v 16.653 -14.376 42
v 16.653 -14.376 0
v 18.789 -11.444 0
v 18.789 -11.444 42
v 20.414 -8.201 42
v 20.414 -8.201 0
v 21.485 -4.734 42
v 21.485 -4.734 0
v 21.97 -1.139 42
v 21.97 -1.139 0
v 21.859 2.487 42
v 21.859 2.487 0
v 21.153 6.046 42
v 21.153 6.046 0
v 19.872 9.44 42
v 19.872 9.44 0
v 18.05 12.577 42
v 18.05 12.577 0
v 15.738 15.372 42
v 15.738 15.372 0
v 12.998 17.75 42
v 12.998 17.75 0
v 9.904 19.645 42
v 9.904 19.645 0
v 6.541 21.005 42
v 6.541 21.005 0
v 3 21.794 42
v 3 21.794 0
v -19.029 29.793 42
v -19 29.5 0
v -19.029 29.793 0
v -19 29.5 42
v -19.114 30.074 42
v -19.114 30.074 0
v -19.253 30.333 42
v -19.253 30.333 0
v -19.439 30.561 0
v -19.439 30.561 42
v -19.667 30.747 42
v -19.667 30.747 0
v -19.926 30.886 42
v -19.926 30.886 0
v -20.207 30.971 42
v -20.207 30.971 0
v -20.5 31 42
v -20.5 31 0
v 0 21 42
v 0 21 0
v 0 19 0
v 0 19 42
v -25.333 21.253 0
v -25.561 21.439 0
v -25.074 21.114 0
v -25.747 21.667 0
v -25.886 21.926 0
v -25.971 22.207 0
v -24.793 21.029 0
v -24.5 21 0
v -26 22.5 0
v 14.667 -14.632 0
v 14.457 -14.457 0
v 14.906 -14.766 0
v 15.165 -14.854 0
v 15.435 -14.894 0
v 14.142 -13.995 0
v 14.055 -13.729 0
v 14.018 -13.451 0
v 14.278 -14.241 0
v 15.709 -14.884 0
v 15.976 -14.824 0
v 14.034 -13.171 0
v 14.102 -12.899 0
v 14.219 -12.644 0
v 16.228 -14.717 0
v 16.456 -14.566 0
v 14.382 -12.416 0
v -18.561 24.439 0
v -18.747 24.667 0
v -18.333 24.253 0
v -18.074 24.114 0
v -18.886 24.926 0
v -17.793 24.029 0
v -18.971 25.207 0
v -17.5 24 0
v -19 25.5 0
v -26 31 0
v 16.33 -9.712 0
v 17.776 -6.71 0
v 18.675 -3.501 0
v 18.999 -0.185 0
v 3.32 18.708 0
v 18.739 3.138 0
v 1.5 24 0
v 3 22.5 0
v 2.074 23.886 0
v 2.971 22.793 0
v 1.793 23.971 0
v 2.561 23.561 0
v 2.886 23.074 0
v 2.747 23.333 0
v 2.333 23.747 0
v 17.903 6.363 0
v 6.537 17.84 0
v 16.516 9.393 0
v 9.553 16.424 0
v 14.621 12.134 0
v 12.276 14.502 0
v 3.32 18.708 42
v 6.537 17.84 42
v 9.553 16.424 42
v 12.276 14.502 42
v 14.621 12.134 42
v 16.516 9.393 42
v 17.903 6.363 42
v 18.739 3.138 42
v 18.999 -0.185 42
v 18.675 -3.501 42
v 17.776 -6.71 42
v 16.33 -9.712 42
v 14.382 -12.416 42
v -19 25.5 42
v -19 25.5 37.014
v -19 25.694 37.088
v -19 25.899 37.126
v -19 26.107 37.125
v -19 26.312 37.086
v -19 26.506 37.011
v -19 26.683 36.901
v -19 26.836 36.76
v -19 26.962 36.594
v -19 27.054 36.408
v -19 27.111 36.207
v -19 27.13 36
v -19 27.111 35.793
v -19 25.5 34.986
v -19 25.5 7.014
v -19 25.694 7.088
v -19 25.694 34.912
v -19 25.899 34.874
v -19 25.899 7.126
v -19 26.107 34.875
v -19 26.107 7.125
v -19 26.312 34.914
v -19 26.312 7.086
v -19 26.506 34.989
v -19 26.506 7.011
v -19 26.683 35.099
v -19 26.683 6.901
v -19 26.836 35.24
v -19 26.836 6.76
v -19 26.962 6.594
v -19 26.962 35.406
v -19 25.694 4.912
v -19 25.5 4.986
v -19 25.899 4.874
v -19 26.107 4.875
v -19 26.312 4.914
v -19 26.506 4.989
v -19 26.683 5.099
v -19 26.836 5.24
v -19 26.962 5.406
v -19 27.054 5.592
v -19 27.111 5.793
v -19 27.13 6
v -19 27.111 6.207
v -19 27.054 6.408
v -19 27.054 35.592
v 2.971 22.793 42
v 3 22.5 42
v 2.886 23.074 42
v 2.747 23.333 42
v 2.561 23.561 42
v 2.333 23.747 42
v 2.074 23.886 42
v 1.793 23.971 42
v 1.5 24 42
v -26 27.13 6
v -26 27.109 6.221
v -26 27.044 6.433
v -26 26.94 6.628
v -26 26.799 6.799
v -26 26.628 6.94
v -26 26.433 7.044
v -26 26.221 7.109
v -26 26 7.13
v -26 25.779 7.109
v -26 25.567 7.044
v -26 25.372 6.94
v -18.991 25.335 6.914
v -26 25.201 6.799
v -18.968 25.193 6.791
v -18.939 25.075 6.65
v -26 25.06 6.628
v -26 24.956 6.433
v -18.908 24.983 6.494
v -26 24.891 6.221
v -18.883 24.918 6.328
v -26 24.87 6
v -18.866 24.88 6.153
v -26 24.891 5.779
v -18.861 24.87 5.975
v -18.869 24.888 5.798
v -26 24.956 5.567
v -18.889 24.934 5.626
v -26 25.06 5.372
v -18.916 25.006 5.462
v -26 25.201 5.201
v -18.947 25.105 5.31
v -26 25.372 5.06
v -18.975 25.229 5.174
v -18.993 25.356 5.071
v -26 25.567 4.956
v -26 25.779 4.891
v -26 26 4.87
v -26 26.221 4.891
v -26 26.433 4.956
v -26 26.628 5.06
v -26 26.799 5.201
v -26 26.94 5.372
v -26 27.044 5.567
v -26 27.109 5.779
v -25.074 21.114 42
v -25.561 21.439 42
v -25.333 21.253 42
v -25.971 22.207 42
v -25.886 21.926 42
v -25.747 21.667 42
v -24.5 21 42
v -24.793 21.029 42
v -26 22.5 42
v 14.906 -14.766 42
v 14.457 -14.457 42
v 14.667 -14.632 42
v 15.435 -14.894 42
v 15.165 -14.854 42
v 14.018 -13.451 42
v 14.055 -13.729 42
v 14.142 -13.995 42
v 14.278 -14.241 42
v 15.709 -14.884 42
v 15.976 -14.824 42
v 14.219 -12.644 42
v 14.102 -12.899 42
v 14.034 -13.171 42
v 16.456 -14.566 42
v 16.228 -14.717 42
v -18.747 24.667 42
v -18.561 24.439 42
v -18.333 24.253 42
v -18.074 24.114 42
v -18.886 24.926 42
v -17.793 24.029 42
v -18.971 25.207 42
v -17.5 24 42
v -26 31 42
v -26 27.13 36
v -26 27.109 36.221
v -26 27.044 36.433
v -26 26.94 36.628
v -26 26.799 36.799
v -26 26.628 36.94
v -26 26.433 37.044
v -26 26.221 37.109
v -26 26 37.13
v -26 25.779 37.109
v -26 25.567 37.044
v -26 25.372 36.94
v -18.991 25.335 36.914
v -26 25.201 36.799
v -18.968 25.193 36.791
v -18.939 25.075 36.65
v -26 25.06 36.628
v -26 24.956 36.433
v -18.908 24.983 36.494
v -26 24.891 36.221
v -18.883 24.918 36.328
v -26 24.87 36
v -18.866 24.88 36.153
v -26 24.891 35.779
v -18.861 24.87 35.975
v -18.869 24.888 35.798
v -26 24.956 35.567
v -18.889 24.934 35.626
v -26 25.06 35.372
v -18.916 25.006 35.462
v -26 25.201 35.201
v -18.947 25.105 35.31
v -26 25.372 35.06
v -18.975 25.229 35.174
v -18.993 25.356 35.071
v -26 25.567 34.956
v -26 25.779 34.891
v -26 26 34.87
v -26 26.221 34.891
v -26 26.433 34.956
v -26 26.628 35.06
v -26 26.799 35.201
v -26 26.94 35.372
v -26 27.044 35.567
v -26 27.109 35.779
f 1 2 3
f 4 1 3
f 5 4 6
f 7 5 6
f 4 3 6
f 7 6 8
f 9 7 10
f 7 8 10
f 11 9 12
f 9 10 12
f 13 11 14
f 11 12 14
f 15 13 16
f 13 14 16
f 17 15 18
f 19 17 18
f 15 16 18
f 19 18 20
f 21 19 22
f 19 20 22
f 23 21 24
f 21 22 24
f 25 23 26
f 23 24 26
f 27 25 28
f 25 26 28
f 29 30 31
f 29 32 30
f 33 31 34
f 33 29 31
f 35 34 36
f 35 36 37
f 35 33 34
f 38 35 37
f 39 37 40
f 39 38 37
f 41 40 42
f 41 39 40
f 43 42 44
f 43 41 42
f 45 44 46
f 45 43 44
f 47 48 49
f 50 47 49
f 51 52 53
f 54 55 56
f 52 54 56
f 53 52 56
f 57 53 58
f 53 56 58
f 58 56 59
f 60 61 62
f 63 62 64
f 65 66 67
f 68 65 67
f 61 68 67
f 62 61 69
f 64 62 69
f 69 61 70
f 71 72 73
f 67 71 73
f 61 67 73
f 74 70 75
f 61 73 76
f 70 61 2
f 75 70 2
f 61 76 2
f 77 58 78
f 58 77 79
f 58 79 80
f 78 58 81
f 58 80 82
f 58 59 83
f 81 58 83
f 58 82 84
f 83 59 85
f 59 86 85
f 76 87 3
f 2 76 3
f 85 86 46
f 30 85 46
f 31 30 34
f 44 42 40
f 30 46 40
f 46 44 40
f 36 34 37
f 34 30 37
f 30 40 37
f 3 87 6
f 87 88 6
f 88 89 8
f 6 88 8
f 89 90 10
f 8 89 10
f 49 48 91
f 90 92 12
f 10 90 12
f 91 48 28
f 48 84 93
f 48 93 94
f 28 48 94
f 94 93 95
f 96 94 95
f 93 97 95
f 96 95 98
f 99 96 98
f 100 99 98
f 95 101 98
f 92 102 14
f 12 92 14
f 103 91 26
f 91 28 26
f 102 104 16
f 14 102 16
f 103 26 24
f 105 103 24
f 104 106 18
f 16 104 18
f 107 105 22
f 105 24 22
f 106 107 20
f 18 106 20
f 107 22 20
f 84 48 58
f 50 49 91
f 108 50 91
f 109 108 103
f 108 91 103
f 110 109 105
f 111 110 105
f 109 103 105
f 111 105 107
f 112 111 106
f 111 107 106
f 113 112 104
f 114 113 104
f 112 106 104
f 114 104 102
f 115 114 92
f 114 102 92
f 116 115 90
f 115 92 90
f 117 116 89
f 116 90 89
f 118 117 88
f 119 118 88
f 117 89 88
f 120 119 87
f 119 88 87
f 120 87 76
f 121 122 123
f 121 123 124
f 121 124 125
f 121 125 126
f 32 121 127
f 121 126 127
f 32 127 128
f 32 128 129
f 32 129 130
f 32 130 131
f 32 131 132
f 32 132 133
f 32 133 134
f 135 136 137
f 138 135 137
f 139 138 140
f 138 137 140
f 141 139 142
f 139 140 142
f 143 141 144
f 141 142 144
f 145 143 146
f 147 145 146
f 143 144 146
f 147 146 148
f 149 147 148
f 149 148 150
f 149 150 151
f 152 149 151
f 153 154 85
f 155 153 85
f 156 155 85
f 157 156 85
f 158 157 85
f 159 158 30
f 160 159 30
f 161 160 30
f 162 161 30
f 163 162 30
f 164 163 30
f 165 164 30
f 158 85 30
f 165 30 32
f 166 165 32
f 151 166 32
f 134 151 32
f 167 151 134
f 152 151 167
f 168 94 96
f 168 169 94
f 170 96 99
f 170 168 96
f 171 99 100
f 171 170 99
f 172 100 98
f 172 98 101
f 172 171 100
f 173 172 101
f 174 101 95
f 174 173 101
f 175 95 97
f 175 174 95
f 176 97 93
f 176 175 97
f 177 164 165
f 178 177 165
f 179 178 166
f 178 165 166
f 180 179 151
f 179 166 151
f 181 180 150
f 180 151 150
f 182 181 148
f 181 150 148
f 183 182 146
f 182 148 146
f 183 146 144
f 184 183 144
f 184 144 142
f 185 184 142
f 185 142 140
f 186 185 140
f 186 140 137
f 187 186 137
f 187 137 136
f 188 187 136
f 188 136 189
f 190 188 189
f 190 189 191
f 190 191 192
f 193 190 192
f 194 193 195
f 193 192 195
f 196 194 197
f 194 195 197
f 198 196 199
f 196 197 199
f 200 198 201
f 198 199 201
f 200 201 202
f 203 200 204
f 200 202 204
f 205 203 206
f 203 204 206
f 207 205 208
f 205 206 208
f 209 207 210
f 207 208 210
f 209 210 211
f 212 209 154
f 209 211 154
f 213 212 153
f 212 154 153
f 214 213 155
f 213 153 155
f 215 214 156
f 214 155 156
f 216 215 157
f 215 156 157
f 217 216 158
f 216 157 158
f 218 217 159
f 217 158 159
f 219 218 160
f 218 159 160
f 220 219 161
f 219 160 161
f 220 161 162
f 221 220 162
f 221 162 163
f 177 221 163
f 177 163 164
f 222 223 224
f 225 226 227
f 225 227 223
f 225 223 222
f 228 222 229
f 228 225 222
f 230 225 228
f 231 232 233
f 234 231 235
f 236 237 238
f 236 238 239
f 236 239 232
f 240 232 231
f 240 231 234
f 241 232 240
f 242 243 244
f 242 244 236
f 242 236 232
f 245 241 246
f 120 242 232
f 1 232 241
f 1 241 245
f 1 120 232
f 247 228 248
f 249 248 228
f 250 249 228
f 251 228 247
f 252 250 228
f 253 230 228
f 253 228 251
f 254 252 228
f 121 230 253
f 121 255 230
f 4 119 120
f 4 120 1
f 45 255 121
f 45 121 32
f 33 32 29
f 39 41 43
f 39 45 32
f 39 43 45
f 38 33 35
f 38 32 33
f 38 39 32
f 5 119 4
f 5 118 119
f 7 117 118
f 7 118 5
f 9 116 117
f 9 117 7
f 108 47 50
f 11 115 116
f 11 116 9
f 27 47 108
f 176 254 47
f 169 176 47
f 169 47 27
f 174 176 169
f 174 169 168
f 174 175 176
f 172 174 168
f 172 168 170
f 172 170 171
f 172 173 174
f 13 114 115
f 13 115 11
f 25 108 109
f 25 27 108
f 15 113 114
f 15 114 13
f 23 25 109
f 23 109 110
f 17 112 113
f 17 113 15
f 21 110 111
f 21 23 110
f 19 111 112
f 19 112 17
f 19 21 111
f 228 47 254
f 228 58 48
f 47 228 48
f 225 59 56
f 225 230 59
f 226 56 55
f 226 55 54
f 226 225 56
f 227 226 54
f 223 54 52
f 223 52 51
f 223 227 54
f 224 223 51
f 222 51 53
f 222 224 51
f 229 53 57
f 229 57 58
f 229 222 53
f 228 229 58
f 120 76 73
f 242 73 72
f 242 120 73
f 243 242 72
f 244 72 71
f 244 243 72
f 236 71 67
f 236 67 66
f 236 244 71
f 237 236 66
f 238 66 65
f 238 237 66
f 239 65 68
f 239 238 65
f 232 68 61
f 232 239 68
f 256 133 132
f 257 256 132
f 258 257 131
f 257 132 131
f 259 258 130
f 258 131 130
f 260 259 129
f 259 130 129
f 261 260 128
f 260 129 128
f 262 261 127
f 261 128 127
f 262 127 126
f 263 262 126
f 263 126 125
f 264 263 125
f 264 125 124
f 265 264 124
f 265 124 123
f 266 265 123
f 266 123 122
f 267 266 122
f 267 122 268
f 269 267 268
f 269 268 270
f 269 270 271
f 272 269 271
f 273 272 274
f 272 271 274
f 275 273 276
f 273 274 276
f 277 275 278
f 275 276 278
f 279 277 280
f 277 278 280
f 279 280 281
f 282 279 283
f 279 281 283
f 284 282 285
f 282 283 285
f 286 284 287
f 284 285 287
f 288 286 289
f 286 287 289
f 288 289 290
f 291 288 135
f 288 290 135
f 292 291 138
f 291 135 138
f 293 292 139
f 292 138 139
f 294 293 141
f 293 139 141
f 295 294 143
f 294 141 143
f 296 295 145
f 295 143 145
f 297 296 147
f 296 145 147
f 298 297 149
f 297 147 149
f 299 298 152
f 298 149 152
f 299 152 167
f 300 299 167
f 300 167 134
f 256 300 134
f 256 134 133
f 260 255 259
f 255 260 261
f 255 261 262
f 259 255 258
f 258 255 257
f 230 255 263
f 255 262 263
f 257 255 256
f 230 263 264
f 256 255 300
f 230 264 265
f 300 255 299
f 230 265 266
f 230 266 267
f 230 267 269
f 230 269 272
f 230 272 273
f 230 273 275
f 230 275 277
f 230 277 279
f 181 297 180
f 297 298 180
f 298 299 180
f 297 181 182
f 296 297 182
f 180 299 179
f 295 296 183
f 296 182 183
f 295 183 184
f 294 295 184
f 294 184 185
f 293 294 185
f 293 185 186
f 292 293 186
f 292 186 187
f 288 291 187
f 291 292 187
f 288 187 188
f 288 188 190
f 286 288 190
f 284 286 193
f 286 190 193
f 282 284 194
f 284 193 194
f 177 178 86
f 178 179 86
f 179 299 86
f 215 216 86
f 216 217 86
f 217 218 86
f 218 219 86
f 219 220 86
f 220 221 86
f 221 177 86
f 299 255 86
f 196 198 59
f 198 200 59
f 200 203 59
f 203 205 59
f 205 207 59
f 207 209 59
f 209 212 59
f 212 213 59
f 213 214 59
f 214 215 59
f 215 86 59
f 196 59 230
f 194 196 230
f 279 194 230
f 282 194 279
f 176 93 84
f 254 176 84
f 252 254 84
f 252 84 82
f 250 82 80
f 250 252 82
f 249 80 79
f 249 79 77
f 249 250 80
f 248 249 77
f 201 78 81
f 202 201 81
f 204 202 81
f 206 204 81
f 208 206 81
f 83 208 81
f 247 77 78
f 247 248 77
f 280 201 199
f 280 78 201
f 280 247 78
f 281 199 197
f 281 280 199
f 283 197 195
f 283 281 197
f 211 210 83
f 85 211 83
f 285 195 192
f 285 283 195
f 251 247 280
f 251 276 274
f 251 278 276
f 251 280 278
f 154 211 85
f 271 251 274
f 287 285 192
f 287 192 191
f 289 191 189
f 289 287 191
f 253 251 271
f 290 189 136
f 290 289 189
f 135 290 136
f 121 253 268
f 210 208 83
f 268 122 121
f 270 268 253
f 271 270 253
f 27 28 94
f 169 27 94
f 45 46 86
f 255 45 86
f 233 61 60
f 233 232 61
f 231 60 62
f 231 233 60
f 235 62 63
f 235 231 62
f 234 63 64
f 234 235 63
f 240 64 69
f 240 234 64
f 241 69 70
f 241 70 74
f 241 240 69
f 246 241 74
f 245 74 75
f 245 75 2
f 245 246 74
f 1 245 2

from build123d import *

# Parameters (mm, degrees)
F1_DEPTH = 42
F2_R     = 1.49999
F4_D     = 2.2606
F4_DEPTH = 18.57375
F4_TIP   = 0.6791527577


# Not quite as in the source:
# - a fillet or chamfer is up to 0.001 mm smaller than in the source, because OpenCascade refuses the exact size


with BuildPart() as f1:
    # F0 (on Top) → F1 (new body)
    with BuildSketch(Plane.XY):
        with BuildLine():
            ThreePointArc((0, 19), (17.5537111177, 7.2709852149), (13.4350288425, -13.4350288425))
            Line((13.4350288425, -13.4350288425), (15.5563491861, -15.5563491861))
            ThreePointArc((15.5563491861, -15.5563491861), (20.8531990078, 7.0102846689), (3, 21.7944947177))
            Line((3, 21.7944947177), (3, 24))
            Line((3, 24), (-19, 24))
            Line((-19, 24), (-19, 31))
            Line((-19, 31), (-26, 31))
            Line((-26, 31), (-26, 21))
            Line((-26, 21), (0, 21))
            Line((0, 21), (0, 19))
        make_face()
    extrude(amount=F1_DEPTH)

    # F2 (radius 1.5 in the source; OpenCascade refuses exactly that, so slightly less here)
    f2_edges = [f1.edges().sort_by_distance(p)[0] for p in [
        (13.435029, -13.435029, 21),
        (15.556349, -15.556349, 21),
        (-26, 21, 21),
        (3, 24, 21),
        (-19, 24, 21),
        (-19, 31, 21),
    ]]
    fillet(f2_edges, radius=F2_R)

    # F4
    with Locations(Plane(origin=(-26, 0, 0), x_dir=(0, -1, 0), z_dir=(-1, 0, 0))):
        with Locations((-26, 36), (-26, 6)):
            Hole(F4_D / 2, depth=F4_DEPTH)
            with Locations((0, 0, -(F4_DEPTH + F4_TIP / 2))):  # 118° drill point
                Cone(0, F4_D / 2, F4_TIP, mode=Mode.SUBTRACT)


solid = f1.part
